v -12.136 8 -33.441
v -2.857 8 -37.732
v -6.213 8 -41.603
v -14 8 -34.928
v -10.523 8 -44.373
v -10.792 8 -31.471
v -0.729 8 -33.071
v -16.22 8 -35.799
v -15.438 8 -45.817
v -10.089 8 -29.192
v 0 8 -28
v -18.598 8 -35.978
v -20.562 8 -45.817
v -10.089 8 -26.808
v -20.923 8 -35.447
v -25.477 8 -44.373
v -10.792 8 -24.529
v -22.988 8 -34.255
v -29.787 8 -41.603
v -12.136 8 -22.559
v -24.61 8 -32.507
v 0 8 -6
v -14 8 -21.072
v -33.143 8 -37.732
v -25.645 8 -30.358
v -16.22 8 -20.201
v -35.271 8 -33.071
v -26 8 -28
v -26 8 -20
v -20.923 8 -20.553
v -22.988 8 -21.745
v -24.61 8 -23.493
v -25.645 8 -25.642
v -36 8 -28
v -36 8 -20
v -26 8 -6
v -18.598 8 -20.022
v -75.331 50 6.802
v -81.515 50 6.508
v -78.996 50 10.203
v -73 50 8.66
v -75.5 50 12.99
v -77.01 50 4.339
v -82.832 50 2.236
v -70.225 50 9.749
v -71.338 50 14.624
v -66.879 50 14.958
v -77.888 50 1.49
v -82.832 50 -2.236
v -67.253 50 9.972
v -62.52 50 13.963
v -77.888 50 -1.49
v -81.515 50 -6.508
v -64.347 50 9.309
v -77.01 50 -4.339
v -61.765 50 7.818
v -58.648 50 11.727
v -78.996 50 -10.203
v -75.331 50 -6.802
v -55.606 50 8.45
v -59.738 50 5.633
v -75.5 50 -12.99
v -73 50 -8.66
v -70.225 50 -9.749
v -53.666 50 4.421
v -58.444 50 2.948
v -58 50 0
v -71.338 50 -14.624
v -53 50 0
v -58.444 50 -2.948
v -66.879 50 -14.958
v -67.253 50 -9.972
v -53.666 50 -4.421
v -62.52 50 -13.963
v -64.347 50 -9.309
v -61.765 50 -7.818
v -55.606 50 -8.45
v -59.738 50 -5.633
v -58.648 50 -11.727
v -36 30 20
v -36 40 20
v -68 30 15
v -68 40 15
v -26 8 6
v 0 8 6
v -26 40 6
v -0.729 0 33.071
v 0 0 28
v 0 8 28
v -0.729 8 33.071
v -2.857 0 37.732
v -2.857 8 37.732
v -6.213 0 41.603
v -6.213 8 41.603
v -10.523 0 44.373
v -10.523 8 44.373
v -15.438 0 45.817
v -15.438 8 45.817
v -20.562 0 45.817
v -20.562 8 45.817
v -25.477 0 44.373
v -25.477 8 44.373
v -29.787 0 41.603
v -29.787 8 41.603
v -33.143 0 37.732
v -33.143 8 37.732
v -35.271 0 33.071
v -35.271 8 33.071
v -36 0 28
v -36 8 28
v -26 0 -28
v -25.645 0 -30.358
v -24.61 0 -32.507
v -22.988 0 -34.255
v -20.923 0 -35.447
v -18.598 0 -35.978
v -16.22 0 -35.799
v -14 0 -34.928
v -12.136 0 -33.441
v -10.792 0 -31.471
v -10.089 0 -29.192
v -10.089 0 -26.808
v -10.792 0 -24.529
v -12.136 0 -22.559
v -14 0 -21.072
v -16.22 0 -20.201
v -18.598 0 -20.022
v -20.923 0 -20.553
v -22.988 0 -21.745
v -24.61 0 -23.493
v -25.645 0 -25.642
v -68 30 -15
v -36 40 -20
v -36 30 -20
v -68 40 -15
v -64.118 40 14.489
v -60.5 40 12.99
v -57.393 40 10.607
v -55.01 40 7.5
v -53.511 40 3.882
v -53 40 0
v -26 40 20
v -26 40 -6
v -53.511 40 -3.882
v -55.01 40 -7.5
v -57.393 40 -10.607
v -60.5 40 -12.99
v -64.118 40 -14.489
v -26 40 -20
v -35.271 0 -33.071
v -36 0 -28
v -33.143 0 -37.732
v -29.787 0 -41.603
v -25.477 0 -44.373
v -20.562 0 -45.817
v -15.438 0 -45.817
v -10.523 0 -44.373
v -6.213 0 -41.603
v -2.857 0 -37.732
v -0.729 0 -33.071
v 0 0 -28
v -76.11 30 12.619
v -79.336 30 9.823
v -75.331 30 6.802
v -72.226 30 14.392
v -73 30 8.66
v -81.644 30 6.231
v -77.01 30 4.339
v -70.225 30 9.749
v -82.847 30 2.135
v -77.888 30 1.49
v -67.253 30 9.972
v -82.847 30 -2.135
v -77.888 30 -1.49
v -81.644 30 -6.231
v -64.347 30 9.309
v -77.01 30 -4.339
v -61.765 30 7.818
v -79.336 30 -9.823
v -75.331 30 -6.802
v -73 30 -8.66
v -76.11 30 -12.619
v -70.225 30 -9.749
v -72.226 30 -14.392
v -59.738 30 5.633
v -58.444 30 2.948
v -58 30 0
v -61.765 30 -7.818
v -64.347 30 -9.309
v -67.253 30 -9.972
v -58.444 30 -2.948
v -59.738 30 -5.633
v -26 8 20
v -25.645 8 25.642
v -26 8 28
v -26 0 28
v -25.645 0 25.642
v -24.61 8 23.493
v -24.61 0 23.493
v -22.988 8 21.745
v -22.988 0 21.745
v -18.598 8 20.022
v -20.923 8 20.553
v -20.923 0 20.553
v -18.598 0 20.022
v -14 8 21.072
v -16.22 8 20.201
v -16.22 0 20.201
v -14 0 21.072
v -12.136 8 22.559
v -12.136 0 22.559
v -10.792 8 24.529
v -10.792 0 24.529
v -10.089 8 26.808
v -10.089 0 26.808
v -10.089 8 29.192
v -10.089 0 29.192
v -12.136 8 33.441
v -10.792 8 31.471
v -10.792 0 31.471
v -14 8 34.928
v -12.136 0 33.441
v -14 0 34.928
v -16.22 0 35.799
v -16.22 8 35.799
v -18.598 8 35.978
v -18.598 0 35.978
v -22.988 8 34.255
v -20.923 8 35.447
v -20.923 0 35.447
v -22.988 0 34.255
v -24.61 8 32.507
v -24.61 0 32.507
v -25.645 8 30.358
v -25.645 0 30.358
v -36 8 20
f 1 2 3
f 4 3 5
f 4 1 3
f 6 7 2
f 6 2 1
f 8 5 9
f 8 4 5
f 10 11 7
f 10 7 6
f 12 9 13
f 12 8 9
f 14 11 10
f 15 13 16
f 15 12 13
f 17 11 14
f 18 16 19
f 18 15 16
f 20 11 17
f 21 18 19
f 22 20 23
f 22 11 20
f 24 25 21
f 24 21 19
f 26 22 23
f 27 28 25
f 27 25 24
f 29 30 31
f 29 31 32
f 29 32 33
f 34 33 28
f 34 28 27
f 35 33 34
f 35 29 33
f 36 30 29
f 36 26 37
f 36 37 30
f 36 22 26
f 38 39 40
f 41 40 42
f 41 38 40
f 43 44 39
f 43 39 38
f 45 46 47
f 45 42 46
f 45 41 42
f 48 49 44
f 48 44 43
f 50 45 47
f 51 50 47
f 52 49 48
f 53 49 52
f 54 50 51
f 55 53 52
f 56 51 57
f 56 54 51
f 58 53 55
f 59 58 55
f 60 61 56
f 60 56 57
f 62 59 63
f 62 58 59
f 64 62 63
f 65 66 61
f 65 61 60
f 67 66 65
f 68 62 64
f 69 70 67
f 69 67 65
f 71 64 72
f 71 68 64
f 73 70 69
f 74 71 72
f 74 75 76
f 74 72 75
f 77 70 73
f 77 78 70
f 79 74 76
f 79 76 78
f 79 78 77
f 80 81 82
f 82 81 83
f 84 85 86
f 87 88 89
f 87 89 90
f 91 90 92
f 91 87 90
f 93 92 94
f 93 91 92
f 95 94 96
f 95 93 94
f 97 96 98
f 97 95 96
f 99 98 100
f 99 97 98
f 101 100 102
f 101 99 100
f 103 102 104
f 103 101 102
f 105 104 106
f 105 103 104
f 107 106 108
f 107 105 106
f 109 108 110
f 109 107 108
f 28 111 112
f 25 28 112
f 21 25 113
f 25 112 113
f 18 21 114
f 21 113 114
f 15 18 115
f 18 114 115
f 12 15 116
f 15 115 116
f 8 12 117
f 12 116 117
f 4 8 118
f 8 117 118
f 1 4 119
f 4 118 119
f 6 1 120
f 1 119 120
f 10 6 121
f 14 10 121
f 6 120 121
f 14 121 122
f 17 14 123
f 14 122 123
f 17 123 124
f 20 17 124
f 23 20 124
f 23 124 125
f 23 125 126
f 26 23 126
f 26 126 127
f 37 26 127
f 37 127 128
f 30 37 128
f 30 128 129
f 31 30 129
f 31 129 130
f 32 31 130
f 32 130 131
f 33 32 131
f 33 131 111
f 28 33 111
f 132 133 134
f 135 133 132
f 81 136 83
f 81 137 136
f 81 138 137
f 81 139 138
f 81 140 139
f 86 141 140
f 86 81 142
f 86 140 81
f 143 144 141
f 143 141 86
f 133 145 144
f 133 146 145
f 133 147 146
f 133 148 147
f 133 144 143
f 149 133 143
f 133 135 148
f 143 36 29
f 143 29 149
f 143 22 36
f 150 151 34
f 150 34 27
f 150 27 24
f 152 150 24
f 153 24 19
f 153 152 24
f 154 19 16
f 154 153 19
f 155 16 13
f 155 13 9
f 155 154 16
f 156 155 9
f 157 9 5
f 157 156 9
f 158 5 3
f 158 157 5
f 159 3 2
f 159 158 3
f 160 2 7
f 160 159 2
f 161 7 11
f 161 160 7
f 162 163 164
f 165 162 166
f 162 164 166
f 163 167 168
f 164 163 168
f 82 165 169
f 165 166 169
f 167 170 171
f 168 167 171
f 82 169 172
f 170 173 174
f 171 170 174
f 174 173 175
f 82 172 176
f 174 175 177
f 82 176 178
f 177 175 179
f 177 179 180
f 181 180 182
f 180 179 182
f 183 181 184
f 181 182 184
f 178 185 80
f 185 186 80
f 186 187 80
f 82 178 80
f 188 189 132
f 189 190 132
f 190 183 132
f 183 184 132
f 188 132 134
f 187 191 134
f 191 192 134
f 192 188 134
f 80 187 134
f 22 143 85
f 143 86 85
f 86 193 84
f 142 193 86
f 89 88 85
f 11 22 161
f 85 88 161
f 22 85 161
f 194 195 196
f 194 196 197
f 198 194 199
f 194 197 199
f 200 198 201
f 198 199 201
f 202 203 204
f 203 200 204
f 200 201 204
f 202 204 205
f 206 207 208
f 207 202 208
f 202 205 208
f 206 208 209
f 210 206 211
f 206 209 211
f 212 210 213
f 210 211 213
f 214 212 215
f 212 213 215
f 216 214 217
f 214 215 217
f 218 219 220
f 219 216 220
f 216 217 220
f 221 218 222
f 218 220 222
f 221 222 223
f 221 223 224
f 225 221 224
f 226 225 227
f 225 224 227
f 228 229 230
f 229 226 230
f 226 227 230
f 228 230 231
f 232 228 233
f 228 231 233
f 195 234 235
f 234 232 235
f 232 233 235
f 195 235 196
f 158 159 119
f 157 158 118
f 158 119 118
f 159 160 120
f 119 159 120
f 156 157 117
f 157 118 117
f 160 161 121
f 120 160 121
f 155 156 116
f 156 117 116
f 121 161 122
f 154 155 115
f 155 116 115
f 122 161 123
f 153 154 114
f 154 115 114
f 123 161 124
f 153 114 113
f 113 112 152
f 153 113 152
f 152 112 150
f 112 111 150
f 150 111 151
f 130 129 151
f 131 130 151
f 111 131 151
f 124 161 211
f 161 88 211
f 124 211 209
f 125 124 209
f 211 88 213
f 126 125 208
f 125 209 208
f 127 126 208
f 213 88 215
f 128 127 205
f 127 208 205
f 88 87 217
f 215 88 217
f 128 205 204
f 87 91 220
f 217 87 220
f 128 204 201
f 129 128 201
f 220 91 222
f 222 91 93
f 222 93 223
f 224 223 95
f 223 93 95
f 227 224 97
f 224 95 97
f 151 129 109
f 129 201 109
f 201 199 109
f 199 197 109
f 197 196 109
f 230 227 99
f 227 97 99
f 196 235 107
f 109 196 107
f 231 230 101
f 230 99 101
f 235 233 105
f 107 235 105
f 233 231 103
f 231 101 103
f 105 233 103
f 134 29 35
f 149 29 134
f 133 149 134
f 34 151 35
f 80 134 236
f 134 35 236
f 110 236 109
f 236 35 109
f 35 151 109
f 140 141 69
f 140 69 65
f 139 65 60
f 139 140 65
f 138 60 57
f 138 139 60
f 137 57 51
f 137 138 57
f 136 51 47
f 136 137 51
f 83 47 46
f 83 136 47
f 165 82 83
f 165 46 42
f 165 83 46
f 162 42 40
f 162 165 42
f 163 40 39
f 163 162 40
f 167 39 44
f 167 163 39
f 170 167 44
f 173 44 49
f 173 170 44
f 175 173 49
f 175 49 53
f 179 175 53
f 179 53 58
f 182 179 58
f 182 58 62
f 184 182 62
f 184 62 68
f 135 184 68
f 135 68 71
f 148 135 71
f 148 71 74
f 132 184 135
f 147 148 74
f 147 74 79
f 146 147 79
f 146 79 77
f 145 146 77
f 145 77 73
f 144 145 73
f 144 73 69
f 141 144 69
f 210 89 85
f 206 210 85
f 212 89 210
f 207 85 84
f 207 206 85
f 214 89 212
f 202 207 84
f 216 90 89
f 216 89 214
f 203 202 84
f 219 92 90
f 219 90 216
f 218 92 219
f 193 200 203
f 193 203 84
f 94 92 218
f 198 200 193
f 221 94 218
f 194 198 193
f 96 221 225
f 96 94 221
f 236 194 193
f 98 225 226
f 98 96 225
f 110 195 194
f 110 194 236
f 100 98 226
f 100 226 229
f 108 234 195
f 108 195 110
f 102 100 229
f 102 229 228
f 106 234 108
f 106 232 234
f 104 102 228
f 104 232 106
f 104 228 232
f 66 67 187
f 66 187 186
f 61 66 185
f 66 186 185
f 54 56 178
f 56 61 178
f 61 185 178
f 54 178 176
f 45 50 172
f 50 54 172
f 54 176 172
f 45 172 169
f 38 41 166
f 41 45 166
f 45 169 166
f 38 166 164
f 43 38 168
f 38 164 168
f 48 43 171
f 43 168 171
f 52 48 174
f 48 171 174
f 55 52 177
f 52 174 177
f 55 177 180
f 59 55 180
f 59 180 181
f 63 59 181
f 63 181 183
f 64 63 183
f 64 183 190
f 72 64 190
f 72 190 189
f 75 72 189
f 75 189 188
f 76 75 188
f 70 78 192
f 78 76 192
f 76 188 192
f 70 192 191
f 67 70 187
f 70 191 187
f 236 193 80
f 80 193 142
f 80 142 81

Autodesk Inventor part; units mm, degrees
ref_plane "YZ Plane" through (0, 0, 0) normal (1, 0, 0) x (0, 1, 0)
ref_plane "XZ Plane" through (0, 0, 0) normal (0, 1, 0) x (-1, 0, 0)
ref_plane "XY Plane" through (0, 0, 0) normal (0, 0, 1) x (1, 0, 0)
sketch "Sketch1" plane through (0, 0, 0) normal (0, 1, 0) x (-1, 0, 0)
  line L0 (0, 0) -> (36, 0)
  line L1 (36, 0) -> (36, 28)
  line L2 (0, 28) -> (0, 0)
  arc A0 (36, 28) -> (0, 28) centre (18, 28) ccw
  circle A1 centre (18, 28) radius 8
  dimension "d0" = 36
  dimension "d1" = 28
  dimension "d2" = 16
extrude "Extrusion1" add sketch "Sketch1" along normal blind 8
sketch "Sketch2" plane through (0, 0, 0) normal (0, 0, -1) x (-1, 0, 0)
  line L0 (36, 8) -> (0, 8) projected
  line L1 (36, 8) -> (26, 8)
  line L2 (26, 8) -> (26, 40)
  line L3 (26, 40) -> (36, 40)
  line L4 (36, 40) -> (36, 8)
  line L5 (26, 40) -> (0, 8)
  point P0 (0, 0)
  dimension "d5" = 10
  dimension "d6" = 32
mirror "Mirror1" about plane through (0, 0, 0) normal (0, 0, 1) of "Extrusion1"
extrude "Extrusion2" add sketch "Sketch2" along normal mid plane 12 contours L0 L5 L2
extrude "Extrusion3" add sketch "Sketch2" along normal mid plane 40 contours L0 L2 L3 L4
sketch "Sketch3" plane through (-36, 40, -20) normal (0, 1, 0) x (1, 0, 0)
  line L0 (0, 8) -> (0, -48) projected
  circle A0 centre (-32, -20) radius 10
  circle A1 centre (-32, -20) radius 15
  line L1 (0, -48) -> (0, -40) projected
  line L2 (0, -40) -> (-32, -35)
  line L3 (0, 0) -> (10, 0) projected
  line L4 (0, 0) -> (-32, -5)
  point P0 (36, -20)
  dimension "d12" = 20
  dimension "d13" = 30
extrude "Extrusion4" add sketch "Sketch3" against normal blind 10 contours L0 L2 A1 L4
extrude "Extrusion5" add sketch "Sketch3" along normal blind 10 and the other way blind 10 contours A1
